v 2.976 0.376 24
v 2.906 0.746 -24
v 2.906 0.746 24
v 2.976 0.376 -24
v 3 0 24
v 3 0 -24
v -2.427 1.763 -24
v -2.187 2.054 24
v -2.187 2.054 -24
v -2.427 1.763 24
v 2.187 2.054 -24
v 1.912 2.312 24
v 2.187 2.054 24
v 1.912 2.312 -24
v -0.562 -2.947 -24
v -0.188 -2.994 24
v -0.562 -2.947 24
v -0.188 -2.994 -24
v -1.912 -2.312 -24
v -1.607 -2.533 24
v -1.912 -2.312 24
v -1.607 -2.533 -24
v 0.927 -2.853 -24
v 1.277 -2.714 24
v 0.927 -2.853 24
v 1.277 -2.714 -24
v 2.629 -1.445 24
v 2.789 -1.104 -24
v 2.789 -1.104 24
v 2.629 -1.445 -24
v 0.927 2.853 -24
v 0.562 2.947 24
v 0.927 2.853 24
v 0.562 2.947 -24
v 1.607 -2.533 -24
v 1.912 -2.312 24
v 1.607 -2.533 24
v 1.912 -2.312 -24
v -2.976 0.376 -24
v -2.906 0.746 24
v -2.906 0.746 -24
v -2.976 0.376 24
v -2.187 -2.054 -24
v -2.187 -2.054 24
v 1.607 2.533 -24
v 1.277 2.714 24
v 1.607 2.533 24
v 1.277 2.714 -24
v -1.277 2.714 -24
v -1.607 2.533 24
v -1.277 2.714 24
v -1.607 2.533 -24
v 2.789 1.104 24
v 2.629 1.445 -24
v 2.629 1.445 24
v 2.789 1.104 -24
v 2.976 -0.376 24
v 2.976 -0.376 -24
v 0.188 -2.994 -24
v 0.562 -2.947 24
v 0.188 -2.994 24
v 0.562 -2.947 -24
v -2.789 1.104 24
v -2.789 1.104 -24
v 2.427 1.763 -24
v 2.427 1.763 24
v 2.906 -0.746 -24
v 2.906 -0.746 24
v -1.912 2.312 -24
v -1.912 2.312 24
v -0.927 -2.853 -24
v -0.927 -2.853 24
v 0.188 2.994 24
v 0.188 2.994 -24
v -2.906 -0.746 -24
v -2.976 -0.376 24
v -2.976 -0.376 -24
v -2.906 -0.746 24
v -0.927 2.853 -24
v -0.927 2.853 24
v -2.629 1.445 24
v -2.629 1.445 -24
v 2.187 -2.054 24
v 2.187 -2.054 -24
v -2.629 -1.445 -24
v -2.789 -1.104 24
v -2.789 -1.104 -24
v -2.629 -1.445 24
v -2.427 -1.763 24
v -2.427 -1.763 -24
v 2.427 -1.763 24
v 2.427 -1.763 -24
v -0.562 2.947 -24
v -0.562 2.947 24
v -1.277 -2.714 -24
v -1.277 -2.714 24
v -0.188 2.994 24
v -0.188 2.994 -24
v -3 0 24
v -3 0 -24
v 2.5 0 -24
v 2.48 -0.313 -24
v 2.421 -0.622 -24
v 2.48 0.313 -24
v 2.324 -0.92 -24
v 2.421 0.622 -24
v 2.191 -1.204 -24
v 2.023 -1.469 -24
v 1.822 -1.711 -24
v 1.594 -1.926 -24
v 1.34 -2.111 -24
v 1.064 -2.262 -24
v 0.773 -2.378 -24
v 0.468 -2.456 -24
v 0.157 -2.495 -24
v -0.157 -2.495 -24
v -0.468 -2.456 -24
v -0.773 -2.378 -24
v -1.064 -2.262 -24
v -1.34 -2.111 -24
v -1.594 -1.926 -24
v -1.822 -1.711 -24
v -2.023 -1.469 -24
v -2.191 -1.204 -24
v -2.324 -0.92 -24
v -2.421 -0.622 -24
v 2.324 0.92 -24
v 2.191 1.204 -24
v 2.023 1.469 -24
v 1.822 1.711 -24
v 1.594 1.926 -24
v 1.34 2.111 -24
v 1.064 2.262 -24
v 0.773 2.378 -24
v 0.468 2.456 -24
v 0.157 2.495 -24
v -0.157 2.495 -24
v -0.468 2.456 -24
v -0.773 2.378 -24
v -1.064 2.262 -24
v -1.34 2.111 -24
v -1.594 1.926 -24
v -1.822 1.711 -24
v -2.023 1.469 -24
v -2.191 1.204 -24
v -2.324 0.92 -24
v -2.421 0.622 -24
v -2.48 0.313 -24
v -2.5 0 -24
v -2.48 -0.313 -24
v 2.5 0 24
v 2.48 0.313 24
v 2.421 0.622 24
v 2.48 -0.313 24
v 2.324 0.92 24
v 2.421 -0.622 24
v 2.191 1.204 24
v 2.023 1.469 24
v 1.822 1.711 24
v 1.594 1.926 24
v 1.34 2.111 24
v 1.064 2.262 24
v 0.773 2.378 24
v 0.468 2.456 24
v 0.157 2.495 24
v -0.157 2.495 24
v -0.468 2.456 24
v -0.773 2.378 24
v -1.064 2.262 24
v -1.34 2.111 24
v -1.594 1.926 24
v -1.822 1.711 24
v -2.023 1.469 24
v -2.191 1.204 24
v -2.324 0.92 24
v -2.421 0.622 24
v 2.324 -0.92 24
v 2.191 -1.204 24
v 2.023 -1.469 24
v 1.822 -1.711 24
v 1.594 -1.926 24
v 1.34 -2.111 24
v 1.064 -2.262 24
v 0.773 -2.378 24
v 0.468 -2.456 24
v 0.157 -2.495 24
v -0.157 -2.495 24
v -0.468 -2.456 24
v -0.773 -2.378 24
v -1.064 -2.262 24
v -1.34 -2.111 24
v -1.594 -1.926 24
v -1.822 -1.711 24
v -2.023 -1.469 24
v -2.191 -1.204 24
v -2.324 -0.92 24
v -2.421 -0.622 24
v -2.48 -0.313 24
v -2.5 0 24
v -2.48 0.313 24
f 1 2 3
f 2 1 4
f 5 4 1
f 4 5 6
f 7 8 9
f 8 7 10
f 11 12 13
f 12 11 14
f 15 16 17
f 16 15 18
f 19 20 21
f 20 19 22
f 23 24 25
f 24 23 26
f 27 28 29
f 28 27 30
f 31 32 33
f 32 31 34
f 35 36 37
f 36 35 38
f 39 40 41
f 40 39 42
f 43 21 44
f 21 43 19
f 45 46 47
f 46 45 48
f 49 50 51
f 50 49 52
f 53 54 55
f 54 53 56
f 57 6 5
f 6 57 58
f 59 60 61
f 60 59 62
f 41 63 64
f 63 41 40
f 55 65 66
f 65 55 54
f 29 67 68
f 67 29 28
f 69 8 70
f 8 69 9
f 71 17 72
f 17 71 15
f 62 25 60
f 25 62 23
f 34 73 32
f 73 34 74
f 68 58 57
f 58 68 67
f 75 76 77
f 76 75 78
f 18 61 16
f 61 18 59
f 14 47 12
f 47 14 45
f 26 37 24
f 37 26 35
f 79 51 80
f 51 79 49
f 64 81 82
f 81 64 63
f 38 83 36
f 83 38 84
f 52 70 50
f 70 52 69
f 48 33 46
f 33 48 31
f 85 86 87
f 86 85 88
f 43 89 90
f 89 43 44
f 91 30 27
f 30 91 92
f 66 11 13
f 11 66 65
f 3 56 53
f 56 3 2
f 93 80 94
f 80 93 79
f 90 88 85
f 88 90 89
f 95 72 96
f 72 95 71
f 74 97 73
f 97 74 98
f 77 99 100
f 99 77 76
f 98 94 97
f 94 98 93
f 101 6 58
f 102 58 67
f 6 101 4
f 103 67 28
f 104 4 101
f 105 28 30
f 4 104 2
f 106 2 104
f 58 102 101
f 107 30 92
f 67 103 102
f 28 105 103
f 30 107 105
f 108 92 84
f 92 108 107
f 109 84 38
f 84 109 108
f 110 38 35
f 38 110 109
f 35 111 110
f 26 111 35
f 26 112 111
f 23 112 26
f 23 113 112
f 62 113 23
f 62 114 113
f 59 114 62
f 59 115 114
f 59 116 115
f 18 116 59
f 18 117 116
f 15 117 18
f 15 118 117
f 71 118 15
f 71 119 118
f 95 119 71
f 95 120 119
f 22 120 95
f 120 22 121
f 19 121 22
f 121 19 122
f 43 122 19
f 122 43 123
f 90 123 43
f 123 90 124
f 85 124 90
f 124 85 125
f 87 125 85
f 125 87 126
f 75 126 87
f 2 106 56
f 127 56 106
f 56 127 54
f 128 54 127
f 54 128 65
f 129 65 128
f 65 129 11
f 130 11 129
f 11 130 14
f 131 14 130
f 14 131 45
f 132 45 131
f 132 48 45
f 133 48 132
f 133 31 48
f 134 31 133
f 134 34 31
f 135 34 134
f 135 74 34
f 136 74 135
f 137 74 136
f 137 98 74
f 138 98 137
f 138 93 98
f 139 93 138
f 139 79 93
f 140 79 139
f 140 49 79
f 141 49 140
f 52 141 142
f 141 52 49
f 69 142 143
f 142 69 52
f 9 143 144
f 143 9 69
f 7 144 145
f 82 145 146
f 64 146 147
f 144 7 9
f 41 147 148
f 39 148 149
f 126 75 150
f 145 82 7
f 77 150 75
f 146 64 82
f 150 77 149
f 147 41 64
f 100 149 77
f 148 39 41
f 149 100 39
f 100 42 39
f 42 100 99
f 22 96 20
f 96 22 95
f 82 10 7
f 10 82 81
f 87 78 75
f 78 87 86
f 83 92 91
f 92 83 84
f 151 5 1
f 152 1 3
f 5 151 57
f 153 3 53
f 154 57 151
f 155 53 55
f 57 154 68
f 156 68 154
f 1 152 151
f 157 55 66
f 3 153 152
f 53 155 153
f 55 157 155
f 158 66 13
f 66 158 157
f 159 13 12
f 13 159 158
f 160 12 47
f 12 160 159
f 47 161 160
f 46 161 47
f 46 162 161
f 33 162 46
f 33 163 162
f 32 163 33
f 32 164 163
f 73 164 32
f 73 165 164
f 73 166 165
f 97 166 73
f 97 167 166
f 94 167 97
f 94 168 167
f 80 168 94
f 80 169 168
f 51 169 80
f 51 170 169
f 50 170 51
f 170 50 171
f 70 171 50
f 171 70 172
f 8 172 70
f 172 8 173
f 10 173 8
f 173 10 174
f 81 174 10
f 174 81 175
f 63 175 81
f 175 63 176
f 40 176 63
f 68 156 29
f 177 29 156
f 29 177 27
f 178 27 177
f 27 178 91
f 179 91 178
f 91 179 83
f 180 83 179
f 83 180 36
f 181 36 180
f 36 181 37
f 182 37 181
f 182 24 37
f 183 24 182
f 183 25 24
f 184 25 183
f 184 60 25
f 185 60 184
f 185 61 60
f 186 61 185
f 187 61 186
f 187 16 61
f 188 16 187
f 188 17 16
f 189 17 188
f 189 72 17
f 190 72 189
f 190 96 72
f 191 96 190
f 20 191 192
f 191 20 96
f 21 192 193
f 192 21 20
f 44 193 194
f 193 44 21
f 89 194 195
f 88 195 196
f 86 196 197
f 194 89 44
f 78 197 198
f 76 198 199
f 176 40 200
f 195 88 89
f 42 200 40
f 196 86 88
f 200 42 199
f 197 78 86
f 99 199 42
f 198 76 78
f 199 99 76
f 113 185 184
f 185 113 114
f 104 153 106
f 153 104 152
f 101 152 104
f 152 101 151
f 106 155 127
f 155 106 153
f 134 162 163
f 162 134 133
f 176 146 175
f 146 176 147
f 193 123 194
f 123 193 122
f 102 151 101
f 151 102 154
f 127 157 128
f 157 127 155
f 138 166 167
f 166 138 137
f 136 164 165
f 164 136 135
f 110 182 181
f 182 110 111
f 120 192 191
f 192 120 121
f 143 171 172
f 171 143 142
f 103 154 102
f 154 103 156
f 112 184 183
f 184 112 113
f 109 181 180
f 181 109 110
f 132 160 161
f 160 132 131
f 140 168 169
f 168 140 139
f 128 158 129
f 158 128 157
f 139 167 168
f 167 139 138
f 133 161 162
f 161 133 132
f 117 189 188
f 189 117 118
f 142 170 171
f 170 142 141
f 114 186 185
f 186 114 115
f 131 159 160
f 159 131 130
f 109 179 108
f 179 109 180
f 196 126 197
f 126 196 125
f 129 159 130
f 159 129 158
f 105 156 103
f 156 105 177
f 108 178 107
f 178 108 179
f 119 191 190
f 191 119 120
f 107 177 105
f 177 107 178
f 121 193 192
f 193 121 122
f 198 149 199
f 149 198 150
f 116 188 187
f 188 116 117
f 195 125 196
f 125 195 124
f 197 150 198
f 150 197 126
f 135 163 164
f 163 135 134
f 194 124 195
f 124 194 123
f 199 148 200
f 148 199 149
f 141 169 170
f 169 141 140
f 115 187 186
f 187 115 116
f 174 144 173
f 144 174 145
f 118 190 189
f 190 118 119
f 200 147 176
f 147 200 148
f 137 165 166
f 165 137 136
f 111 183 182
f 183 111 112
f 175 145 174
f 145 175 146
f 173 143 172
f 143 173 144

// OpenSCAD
$fn = 50;


difference() {
	union() {
		translate(v = [0, 0, -24.0000000000]) {
			cylinder(h = 48, r = 3.0000000000);
		}
	}
	union() {
		translate(v = [0, 0, -100.0000000000]) {
			cylinder(h = 200, r = 2.5000000000);
		}
	}
}
